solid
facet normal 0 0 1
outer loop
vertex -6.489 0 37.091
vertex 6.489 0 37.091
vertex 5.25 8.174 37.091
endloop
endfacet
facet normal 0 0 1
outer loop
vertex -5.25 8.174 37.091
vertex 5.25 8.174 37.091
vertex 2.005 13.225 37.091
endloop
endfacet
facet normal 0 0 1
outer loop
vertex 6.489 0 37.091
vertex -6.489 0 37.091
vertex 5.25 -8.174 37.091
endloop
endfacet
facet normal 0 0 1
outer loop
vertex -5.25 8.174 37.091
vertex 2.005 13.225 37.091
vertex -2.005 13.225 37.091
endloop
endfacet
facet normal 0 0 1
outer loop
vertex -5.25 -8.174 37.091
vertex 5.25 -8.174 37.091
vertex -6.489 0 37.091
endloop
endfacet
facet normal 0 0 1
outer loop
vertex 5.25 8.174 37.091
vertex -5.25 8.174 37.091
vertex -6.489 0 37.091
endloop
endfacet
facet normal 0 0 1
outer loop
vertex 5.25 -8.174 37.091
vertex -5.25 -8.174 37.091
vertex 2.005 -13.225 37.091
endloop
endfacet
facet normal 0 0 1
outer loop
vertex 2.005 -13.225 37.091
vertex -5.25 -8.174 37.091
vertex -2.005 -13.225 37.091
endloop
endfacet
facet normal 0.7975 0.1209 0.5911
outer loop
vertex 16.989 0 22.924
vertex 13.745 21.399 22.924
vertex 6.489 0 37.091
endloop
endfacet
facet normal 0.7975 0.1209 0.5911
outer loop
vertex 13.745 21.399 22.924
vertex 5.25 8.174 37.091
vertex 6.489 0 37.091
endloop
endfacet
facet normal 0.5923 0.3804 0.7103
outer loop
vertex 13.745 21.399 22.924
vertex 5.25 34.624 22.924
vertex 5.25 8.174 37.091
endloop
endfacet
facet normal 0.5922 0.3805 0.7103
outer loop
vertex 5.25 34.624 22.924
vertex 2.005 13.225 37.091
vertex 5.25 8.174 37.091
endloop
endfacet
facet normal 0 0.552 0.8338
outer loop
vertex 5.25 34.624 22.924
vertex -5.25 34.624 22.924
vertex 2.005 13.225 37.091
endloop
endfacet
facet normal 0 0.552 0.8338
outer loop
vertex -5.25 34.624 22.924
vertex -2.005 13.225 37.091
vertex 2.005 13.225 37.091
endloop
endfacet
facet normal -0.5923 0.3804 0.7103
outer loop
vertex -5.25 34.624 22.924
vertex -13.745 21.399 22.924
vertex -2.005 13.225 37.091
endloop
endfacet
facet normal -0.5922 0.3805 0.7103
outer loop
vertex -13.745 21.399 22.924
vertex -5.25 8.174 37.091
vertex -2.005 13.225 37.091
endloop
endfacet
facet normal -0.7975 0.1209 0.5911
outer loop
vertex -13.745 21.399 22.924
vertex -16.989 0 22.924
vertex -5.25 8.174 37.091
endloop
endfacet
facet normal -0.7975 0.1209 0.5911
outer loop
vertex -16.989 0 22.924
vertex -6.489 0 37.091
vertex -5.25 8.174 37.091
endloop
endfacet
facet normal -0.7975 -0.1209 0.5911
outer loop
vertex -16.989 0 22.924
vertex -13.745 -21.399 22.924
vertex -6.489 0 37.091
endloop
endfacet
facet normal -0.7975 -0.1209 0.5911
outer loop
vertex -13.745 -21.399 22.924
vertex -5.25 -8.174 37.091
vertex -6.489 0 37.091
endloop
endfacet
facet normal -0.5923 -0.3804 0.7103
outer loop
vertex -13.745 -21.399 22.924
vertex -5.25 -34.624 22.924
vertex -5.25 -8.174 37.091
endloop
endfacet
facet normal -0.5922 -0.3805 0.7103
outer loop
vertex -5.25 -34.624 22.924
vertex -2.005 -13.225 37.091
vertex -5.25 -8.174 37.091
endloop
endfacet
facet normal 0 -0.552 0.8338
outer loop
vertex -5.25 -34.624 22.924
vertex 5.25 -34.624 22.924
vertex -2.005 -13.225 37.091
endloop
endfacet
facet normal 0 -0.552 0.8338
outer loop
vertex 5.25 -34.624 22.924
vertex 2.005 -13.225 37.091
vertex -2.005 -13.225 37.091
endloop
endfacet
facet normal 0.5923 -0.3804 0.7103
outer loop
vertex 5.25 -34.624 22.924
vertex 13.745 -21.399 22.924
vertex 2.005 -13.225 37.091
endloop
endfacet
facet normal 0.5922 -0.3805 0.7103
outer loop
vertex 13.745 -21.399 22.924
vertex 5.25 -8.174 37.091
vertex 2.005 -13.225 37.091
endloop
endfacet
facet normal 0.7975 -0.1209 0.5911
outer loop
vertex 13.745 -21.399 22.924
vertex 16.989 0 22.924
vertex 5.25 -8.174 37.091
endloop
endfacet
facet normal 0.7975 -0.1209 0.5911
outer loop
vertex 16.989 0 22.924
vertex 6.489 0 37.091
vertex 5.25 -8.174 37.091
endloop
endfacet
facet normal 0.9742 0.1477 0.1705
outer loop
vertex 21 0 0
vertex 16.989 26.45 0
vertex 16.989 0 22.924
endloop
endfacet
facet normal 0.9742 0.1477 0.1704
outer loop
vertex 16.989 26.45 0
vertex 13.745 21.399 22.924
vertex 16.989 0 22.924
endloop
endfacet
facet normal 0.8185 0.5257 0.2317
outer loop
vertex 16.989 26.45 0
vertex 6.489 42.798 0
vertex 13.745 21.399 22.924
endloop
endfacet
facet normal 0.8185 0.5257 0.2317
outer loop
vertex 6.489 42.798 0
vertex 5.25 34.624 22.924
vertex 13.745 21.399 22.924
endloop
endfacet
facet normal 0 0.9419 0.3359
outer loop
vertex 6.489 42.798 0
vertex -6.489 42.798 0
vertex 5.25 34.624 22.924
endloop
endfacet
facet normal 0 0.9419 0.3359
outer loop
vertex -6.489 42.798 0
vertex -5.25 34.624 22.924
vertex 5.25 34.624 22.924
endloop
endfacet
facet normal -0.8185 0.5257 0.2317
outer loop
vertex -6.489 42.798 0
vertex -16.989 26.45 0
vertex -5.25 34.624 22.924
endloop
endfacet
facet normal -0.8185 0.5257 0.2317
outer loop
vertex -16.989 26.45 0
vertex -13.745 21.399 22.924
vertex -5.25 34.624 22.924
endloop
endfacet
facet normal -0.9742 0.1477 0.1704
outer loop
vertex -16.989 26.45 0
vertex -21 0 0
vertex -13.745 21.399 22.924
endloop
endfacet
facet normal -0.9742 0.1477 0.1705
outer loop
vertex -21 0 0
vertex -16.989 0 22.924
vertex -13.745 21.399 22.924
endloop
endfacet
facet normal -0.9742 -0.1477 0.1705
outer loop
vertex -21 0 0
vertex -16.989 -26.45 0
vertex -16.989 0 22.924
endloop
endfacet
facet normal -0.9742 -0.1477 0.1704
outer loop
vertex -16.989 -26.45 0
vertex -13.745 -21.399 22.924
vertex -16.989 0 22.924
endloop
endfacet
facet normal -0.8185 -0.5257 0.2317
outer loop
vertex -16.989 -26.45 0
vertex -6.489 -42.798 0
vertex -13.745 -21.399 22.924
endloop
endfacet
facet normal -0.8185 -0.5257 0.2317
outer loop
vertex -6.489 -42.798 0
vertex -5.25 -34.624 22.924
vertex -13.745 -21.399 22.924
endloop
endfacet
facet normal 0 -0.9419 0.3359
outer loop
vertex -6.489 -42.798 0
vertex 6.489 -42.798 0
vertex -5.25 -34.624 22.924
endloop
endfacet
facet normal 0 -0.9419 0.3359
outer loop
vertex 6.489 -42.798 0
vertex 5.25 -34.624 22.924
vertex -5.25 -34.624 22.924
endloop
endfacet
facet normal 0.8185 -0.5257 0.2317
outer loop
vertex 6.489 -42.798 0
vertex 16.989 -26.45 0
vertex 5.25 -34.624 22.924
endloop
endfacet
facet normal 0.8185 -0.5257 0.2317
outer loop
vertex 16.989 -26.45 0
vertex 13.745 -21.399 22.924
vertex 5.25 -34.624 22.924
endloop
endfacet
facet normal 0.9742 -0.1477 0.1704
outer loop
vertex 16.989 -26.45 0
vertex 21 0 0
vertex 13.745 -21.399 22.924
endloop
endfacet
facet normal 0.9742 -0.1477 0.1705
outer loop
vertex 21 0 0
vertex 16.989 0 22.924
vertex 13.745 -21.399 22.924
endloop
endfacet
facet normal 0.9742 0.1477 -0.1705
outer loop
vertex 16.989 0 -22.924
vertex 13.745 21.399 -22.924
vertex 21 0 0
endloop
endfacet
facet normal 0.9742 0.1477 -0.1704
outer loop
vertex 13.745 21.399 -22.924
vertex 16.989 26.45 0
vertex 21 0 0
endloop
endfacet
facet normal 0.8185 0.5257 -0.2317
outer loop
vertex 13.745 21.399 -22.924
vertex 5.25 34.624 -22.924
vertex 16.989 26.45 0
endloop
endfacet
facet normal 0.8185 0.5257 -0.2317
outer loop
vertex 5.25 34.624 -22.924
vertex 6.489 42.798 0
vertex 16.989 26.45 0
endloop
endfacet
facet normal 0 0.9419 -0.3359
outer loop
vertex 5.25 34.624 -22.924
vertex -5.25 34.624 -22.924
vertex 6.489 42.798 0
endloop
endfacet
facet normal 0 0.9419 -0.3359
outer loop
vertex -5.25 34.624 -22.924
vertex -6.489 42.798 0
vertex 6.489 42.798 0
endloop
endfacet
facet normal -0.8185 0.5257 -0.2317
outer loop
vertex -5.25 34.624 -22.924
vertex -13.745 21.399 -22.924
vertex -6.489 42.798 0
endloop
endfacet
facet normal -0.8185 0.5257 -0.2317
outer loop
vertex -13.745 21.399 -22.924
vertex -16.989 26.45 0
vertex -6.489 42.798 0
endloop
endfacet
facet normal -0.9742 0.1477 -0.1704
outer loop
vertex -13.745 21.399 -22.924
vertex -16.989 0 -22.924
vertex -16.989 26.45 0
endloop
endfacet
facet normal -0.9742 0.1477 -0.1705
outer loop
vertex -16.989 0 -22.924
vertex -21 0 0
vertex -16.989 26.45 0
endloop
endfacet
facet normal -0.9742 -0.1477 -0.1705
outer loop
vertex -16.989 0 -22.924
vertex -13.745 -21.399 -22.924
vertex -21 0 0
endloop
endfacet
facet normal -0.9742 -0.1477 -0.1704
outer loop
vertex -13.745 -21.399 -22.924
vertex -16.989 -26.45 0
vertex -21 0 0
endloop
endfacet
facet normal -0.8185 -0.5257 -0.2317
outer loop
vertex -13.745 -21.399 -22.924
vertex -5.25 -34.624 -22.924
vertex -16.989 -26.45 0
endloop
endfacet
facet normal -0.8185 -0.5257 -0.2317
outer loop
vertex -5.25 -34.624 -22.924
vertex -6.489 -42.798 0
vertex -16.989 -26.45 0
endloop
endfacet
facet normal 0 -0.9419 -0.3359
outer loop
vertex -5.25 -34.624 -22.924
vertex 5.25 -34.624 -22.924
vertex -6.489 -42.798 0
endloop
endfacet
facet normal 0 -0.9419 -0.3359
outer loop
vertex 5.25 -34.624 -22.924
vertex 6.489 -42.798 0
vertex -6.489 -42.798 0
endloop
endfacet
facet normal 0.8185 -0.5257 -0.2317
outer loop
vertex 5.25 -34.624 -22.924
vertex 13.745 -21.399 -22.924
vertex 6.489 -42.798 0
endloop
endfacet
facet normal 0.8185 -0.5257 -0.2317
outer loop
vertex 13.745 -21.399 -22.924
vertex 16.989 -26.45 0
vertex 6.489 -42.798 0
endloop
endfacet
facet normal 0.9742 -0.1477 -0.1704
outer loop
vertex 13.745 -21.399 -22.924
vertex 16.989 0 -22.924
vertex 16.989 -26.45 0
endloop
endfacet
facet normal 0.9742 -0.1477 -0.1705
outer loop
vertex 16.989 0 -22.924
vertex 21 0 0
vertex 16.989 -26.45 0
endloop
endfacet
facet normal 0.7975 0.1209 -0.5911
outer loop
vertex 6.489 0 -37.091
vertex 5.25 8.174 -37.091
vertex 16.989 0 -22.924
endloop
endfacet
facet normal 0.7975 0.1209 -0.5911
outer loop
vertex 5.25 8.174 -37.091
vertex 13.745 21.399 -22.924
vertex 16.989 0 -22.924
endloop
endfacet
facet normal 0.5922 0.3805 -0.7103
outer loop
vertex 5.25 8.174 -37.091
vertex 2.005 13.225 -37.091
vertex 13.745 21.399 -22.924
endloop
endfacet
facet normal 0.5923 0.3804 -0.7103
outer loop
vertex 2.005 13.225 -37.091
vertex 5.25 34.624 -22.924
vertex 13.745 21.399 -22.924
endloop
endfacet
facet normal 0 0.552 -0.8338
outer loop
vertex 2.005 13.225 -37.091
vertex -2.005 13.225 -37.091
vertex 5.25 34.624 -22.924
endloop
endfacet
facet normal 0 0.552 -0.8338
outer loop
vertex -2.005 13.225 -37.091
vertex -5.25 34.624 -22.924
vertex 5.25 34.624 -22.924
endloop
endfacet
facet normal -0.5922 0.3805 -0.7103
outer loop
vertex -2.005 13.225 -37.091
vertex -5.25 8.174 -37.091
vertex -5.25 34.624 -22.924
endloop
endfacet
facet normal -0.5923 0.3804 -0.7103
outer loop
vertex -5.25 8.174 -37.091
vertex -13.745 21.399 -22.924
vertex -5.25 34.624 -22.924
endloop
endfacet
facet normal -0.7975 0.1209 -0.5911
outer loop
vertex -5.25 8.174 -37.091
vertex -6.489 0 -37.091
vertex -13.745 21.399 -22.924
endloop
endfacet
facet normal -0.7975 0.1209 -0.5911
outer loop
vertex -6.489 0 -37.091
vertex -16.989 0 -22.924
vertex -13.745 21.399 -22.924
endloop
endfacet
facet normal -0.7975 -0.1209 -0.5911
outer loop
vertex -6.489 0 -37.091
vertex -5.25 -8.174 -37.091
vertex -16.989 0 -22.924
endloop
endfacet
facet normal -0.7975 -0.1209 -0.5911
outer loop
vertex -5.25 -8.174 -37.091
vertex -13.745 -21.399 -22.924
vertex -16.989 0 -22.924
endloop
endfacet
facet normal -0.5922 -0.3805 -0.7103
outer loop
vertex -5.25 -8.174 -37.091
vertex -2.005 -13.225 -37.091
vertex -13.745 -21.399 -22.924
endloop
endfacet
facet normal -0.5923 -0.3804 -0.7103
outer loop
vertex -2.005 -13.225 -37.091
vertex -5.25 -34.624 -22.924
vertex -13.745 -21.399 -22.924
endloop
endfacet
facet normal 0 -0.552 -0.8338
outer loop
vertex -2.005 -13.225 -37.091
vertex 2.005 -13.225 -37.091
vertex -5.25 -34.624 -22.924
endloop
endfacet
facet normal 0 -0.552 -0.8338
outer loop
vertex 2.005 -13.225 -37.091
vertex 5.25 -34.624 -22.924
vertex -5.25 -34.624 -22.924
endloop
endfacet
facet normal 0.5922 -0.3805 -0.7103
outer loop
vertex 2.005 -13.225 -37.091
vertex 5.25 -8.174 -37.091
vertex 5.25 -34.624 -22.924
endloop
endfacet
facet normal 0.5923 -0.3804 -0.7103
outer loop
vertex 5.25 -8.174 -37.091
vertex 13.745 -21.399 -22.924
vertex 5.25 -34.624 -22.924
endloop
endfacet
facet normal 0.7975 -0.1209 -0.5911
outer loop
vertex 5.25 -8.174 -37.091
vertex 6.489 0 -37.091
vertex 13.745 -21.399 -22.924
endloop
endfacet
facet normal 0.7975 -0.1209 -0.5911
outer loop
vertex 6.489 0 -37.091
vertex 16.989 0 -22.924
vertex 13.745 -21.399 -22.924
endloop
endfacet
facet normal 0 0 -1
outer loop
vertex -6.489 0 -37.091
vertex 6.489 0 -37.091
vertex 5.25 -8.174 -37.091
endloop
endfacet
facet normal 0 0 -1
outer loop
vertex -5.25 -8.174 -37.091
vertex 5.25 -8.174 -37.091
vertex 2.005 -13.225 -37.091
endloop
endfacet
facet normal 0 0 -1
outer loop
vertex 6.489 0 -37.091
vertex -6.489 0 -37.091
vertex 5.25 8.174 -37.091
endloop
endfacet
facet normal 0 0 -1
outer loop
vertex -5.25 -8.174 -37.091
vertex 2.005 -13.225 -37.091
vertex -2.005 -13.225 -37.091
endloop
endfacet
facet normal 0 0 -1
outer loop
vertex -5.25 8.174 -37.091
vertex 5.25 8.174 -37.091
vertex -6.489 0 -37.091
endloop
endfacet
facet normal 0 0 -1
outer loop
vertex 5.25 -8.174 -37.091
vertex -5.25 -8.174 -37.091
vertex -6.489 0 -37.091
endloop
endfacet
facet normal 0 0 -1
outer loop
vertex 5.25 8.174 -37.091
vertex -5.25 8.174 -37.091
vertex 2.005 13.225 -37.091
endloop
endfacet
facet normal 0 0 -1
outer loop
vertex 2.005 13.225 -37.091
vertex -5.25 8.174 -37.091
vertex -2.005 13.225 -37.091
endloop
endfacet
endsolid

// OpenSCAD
// Generated by SolidPython 1.0.1 on 2020-07-29 00:46:48


scale(v = [7, 15, 13]) {
	sphere(r = 3);
}
/***********************************************
*********      SolidPython code:      **********
************************************************
 
# import packages: SolidPython
from solid import *
from solid.utils import *
from itertools import chain, combinations, permutations


class Resize:

    def __init__(self, scad_file):
        self.scad_file = scad_file
        #self.scad_file = import_scad(scad_file)
        # cone/cylinder param:
        self.r1 = 0
        self.r2 = 0
        self.h = 0
        # rectangular prism param:
        self.w = 0
        self.l = 0
        # ellipse param:
        self.r = 0

    # import OpenScad code (file name corresponds to shape)


    # classify shape + parameters
    def assign(self, param1, param2, param3):
        if self.scad_file == 'cone.scad':
            self.r1 = param1
            self.r2 = param2
            self.h = param3
        elif self.scad_file == 'cylinder.scad':
            self.r1 = param1
            self.r2 = param2
            self.h = param3
        elif self.scad_file == 'rectangularPrism.scad':
            self.h = param1
            self.l = param2
            self.w = param3
        else:
            self.r = param1
            self.h = param2

    # resize parameters
    def iterate(self):
        x = range(3, 20, 2)
        i = 1
        if self.scad_file == 'cone.scad':
            tempList = list(permutations(x, 2))
            for temp in tempList:
                param1 = temp[0]
                param2 = temp[1]
                filepath = 'produced_scad_files/' + 'cone' + str(param1) + '_' + str(param2) + '_' + '.scad'
                scad_render_to_file(cylinder(h=param1, r1=param2, r2=0), filepath)

        elif self.scad_file == 'cylinder.scad':
            tempList = list(permutations(x, 3))
            for temp in tempList:
                param1 = temp[0]
                param2 = temp[1]
                filepath = 'produced_scad_files/' + 'cylinder' + str(param1) + '_' + str(param2) + '_' + '.scad'
                scad_render_to_file(cylinder(h=param1, r1=param2, r2=param2), filepath)

        elif self.scad_file == 'rectangularPrism.scad':
            tempList = list(permutations(x, 3))
            for temp in tempList:
                param1 = temp[0]
                param2 = temp[1]
                param3 = temp[2]
                filepath = 'produced_scad_files/' + 'rectangularPrism' + str(param1) + '_' + str(param2) + '_' + str(
                    param3) + '.scad'
                scad_render_to_file(cube(size=(param1, param2, param3)), filepath)

        elif self.scad_file == 'ellipse.scad':
            tempList = list(permutations(x, 4))
            for temp in tempList:
                param1 = temp[0]
                param2 = temp[1]
                param3 = temp[2]
                param4 = temp[3]
                filepath = 'produced_scad_files/' + 'ellipse' + str(param1) + '_' + str(param2) + '_' + str(param3) + '_' + str(param4) + '.scad'
                scad_render_to_file(scale([param1, param2, param3])(sphere(r=param4)), filepath)

    def render_to_scadfile(self):
        scad_render_to_file(scad, 'example.scad') 
 
************************************************/
